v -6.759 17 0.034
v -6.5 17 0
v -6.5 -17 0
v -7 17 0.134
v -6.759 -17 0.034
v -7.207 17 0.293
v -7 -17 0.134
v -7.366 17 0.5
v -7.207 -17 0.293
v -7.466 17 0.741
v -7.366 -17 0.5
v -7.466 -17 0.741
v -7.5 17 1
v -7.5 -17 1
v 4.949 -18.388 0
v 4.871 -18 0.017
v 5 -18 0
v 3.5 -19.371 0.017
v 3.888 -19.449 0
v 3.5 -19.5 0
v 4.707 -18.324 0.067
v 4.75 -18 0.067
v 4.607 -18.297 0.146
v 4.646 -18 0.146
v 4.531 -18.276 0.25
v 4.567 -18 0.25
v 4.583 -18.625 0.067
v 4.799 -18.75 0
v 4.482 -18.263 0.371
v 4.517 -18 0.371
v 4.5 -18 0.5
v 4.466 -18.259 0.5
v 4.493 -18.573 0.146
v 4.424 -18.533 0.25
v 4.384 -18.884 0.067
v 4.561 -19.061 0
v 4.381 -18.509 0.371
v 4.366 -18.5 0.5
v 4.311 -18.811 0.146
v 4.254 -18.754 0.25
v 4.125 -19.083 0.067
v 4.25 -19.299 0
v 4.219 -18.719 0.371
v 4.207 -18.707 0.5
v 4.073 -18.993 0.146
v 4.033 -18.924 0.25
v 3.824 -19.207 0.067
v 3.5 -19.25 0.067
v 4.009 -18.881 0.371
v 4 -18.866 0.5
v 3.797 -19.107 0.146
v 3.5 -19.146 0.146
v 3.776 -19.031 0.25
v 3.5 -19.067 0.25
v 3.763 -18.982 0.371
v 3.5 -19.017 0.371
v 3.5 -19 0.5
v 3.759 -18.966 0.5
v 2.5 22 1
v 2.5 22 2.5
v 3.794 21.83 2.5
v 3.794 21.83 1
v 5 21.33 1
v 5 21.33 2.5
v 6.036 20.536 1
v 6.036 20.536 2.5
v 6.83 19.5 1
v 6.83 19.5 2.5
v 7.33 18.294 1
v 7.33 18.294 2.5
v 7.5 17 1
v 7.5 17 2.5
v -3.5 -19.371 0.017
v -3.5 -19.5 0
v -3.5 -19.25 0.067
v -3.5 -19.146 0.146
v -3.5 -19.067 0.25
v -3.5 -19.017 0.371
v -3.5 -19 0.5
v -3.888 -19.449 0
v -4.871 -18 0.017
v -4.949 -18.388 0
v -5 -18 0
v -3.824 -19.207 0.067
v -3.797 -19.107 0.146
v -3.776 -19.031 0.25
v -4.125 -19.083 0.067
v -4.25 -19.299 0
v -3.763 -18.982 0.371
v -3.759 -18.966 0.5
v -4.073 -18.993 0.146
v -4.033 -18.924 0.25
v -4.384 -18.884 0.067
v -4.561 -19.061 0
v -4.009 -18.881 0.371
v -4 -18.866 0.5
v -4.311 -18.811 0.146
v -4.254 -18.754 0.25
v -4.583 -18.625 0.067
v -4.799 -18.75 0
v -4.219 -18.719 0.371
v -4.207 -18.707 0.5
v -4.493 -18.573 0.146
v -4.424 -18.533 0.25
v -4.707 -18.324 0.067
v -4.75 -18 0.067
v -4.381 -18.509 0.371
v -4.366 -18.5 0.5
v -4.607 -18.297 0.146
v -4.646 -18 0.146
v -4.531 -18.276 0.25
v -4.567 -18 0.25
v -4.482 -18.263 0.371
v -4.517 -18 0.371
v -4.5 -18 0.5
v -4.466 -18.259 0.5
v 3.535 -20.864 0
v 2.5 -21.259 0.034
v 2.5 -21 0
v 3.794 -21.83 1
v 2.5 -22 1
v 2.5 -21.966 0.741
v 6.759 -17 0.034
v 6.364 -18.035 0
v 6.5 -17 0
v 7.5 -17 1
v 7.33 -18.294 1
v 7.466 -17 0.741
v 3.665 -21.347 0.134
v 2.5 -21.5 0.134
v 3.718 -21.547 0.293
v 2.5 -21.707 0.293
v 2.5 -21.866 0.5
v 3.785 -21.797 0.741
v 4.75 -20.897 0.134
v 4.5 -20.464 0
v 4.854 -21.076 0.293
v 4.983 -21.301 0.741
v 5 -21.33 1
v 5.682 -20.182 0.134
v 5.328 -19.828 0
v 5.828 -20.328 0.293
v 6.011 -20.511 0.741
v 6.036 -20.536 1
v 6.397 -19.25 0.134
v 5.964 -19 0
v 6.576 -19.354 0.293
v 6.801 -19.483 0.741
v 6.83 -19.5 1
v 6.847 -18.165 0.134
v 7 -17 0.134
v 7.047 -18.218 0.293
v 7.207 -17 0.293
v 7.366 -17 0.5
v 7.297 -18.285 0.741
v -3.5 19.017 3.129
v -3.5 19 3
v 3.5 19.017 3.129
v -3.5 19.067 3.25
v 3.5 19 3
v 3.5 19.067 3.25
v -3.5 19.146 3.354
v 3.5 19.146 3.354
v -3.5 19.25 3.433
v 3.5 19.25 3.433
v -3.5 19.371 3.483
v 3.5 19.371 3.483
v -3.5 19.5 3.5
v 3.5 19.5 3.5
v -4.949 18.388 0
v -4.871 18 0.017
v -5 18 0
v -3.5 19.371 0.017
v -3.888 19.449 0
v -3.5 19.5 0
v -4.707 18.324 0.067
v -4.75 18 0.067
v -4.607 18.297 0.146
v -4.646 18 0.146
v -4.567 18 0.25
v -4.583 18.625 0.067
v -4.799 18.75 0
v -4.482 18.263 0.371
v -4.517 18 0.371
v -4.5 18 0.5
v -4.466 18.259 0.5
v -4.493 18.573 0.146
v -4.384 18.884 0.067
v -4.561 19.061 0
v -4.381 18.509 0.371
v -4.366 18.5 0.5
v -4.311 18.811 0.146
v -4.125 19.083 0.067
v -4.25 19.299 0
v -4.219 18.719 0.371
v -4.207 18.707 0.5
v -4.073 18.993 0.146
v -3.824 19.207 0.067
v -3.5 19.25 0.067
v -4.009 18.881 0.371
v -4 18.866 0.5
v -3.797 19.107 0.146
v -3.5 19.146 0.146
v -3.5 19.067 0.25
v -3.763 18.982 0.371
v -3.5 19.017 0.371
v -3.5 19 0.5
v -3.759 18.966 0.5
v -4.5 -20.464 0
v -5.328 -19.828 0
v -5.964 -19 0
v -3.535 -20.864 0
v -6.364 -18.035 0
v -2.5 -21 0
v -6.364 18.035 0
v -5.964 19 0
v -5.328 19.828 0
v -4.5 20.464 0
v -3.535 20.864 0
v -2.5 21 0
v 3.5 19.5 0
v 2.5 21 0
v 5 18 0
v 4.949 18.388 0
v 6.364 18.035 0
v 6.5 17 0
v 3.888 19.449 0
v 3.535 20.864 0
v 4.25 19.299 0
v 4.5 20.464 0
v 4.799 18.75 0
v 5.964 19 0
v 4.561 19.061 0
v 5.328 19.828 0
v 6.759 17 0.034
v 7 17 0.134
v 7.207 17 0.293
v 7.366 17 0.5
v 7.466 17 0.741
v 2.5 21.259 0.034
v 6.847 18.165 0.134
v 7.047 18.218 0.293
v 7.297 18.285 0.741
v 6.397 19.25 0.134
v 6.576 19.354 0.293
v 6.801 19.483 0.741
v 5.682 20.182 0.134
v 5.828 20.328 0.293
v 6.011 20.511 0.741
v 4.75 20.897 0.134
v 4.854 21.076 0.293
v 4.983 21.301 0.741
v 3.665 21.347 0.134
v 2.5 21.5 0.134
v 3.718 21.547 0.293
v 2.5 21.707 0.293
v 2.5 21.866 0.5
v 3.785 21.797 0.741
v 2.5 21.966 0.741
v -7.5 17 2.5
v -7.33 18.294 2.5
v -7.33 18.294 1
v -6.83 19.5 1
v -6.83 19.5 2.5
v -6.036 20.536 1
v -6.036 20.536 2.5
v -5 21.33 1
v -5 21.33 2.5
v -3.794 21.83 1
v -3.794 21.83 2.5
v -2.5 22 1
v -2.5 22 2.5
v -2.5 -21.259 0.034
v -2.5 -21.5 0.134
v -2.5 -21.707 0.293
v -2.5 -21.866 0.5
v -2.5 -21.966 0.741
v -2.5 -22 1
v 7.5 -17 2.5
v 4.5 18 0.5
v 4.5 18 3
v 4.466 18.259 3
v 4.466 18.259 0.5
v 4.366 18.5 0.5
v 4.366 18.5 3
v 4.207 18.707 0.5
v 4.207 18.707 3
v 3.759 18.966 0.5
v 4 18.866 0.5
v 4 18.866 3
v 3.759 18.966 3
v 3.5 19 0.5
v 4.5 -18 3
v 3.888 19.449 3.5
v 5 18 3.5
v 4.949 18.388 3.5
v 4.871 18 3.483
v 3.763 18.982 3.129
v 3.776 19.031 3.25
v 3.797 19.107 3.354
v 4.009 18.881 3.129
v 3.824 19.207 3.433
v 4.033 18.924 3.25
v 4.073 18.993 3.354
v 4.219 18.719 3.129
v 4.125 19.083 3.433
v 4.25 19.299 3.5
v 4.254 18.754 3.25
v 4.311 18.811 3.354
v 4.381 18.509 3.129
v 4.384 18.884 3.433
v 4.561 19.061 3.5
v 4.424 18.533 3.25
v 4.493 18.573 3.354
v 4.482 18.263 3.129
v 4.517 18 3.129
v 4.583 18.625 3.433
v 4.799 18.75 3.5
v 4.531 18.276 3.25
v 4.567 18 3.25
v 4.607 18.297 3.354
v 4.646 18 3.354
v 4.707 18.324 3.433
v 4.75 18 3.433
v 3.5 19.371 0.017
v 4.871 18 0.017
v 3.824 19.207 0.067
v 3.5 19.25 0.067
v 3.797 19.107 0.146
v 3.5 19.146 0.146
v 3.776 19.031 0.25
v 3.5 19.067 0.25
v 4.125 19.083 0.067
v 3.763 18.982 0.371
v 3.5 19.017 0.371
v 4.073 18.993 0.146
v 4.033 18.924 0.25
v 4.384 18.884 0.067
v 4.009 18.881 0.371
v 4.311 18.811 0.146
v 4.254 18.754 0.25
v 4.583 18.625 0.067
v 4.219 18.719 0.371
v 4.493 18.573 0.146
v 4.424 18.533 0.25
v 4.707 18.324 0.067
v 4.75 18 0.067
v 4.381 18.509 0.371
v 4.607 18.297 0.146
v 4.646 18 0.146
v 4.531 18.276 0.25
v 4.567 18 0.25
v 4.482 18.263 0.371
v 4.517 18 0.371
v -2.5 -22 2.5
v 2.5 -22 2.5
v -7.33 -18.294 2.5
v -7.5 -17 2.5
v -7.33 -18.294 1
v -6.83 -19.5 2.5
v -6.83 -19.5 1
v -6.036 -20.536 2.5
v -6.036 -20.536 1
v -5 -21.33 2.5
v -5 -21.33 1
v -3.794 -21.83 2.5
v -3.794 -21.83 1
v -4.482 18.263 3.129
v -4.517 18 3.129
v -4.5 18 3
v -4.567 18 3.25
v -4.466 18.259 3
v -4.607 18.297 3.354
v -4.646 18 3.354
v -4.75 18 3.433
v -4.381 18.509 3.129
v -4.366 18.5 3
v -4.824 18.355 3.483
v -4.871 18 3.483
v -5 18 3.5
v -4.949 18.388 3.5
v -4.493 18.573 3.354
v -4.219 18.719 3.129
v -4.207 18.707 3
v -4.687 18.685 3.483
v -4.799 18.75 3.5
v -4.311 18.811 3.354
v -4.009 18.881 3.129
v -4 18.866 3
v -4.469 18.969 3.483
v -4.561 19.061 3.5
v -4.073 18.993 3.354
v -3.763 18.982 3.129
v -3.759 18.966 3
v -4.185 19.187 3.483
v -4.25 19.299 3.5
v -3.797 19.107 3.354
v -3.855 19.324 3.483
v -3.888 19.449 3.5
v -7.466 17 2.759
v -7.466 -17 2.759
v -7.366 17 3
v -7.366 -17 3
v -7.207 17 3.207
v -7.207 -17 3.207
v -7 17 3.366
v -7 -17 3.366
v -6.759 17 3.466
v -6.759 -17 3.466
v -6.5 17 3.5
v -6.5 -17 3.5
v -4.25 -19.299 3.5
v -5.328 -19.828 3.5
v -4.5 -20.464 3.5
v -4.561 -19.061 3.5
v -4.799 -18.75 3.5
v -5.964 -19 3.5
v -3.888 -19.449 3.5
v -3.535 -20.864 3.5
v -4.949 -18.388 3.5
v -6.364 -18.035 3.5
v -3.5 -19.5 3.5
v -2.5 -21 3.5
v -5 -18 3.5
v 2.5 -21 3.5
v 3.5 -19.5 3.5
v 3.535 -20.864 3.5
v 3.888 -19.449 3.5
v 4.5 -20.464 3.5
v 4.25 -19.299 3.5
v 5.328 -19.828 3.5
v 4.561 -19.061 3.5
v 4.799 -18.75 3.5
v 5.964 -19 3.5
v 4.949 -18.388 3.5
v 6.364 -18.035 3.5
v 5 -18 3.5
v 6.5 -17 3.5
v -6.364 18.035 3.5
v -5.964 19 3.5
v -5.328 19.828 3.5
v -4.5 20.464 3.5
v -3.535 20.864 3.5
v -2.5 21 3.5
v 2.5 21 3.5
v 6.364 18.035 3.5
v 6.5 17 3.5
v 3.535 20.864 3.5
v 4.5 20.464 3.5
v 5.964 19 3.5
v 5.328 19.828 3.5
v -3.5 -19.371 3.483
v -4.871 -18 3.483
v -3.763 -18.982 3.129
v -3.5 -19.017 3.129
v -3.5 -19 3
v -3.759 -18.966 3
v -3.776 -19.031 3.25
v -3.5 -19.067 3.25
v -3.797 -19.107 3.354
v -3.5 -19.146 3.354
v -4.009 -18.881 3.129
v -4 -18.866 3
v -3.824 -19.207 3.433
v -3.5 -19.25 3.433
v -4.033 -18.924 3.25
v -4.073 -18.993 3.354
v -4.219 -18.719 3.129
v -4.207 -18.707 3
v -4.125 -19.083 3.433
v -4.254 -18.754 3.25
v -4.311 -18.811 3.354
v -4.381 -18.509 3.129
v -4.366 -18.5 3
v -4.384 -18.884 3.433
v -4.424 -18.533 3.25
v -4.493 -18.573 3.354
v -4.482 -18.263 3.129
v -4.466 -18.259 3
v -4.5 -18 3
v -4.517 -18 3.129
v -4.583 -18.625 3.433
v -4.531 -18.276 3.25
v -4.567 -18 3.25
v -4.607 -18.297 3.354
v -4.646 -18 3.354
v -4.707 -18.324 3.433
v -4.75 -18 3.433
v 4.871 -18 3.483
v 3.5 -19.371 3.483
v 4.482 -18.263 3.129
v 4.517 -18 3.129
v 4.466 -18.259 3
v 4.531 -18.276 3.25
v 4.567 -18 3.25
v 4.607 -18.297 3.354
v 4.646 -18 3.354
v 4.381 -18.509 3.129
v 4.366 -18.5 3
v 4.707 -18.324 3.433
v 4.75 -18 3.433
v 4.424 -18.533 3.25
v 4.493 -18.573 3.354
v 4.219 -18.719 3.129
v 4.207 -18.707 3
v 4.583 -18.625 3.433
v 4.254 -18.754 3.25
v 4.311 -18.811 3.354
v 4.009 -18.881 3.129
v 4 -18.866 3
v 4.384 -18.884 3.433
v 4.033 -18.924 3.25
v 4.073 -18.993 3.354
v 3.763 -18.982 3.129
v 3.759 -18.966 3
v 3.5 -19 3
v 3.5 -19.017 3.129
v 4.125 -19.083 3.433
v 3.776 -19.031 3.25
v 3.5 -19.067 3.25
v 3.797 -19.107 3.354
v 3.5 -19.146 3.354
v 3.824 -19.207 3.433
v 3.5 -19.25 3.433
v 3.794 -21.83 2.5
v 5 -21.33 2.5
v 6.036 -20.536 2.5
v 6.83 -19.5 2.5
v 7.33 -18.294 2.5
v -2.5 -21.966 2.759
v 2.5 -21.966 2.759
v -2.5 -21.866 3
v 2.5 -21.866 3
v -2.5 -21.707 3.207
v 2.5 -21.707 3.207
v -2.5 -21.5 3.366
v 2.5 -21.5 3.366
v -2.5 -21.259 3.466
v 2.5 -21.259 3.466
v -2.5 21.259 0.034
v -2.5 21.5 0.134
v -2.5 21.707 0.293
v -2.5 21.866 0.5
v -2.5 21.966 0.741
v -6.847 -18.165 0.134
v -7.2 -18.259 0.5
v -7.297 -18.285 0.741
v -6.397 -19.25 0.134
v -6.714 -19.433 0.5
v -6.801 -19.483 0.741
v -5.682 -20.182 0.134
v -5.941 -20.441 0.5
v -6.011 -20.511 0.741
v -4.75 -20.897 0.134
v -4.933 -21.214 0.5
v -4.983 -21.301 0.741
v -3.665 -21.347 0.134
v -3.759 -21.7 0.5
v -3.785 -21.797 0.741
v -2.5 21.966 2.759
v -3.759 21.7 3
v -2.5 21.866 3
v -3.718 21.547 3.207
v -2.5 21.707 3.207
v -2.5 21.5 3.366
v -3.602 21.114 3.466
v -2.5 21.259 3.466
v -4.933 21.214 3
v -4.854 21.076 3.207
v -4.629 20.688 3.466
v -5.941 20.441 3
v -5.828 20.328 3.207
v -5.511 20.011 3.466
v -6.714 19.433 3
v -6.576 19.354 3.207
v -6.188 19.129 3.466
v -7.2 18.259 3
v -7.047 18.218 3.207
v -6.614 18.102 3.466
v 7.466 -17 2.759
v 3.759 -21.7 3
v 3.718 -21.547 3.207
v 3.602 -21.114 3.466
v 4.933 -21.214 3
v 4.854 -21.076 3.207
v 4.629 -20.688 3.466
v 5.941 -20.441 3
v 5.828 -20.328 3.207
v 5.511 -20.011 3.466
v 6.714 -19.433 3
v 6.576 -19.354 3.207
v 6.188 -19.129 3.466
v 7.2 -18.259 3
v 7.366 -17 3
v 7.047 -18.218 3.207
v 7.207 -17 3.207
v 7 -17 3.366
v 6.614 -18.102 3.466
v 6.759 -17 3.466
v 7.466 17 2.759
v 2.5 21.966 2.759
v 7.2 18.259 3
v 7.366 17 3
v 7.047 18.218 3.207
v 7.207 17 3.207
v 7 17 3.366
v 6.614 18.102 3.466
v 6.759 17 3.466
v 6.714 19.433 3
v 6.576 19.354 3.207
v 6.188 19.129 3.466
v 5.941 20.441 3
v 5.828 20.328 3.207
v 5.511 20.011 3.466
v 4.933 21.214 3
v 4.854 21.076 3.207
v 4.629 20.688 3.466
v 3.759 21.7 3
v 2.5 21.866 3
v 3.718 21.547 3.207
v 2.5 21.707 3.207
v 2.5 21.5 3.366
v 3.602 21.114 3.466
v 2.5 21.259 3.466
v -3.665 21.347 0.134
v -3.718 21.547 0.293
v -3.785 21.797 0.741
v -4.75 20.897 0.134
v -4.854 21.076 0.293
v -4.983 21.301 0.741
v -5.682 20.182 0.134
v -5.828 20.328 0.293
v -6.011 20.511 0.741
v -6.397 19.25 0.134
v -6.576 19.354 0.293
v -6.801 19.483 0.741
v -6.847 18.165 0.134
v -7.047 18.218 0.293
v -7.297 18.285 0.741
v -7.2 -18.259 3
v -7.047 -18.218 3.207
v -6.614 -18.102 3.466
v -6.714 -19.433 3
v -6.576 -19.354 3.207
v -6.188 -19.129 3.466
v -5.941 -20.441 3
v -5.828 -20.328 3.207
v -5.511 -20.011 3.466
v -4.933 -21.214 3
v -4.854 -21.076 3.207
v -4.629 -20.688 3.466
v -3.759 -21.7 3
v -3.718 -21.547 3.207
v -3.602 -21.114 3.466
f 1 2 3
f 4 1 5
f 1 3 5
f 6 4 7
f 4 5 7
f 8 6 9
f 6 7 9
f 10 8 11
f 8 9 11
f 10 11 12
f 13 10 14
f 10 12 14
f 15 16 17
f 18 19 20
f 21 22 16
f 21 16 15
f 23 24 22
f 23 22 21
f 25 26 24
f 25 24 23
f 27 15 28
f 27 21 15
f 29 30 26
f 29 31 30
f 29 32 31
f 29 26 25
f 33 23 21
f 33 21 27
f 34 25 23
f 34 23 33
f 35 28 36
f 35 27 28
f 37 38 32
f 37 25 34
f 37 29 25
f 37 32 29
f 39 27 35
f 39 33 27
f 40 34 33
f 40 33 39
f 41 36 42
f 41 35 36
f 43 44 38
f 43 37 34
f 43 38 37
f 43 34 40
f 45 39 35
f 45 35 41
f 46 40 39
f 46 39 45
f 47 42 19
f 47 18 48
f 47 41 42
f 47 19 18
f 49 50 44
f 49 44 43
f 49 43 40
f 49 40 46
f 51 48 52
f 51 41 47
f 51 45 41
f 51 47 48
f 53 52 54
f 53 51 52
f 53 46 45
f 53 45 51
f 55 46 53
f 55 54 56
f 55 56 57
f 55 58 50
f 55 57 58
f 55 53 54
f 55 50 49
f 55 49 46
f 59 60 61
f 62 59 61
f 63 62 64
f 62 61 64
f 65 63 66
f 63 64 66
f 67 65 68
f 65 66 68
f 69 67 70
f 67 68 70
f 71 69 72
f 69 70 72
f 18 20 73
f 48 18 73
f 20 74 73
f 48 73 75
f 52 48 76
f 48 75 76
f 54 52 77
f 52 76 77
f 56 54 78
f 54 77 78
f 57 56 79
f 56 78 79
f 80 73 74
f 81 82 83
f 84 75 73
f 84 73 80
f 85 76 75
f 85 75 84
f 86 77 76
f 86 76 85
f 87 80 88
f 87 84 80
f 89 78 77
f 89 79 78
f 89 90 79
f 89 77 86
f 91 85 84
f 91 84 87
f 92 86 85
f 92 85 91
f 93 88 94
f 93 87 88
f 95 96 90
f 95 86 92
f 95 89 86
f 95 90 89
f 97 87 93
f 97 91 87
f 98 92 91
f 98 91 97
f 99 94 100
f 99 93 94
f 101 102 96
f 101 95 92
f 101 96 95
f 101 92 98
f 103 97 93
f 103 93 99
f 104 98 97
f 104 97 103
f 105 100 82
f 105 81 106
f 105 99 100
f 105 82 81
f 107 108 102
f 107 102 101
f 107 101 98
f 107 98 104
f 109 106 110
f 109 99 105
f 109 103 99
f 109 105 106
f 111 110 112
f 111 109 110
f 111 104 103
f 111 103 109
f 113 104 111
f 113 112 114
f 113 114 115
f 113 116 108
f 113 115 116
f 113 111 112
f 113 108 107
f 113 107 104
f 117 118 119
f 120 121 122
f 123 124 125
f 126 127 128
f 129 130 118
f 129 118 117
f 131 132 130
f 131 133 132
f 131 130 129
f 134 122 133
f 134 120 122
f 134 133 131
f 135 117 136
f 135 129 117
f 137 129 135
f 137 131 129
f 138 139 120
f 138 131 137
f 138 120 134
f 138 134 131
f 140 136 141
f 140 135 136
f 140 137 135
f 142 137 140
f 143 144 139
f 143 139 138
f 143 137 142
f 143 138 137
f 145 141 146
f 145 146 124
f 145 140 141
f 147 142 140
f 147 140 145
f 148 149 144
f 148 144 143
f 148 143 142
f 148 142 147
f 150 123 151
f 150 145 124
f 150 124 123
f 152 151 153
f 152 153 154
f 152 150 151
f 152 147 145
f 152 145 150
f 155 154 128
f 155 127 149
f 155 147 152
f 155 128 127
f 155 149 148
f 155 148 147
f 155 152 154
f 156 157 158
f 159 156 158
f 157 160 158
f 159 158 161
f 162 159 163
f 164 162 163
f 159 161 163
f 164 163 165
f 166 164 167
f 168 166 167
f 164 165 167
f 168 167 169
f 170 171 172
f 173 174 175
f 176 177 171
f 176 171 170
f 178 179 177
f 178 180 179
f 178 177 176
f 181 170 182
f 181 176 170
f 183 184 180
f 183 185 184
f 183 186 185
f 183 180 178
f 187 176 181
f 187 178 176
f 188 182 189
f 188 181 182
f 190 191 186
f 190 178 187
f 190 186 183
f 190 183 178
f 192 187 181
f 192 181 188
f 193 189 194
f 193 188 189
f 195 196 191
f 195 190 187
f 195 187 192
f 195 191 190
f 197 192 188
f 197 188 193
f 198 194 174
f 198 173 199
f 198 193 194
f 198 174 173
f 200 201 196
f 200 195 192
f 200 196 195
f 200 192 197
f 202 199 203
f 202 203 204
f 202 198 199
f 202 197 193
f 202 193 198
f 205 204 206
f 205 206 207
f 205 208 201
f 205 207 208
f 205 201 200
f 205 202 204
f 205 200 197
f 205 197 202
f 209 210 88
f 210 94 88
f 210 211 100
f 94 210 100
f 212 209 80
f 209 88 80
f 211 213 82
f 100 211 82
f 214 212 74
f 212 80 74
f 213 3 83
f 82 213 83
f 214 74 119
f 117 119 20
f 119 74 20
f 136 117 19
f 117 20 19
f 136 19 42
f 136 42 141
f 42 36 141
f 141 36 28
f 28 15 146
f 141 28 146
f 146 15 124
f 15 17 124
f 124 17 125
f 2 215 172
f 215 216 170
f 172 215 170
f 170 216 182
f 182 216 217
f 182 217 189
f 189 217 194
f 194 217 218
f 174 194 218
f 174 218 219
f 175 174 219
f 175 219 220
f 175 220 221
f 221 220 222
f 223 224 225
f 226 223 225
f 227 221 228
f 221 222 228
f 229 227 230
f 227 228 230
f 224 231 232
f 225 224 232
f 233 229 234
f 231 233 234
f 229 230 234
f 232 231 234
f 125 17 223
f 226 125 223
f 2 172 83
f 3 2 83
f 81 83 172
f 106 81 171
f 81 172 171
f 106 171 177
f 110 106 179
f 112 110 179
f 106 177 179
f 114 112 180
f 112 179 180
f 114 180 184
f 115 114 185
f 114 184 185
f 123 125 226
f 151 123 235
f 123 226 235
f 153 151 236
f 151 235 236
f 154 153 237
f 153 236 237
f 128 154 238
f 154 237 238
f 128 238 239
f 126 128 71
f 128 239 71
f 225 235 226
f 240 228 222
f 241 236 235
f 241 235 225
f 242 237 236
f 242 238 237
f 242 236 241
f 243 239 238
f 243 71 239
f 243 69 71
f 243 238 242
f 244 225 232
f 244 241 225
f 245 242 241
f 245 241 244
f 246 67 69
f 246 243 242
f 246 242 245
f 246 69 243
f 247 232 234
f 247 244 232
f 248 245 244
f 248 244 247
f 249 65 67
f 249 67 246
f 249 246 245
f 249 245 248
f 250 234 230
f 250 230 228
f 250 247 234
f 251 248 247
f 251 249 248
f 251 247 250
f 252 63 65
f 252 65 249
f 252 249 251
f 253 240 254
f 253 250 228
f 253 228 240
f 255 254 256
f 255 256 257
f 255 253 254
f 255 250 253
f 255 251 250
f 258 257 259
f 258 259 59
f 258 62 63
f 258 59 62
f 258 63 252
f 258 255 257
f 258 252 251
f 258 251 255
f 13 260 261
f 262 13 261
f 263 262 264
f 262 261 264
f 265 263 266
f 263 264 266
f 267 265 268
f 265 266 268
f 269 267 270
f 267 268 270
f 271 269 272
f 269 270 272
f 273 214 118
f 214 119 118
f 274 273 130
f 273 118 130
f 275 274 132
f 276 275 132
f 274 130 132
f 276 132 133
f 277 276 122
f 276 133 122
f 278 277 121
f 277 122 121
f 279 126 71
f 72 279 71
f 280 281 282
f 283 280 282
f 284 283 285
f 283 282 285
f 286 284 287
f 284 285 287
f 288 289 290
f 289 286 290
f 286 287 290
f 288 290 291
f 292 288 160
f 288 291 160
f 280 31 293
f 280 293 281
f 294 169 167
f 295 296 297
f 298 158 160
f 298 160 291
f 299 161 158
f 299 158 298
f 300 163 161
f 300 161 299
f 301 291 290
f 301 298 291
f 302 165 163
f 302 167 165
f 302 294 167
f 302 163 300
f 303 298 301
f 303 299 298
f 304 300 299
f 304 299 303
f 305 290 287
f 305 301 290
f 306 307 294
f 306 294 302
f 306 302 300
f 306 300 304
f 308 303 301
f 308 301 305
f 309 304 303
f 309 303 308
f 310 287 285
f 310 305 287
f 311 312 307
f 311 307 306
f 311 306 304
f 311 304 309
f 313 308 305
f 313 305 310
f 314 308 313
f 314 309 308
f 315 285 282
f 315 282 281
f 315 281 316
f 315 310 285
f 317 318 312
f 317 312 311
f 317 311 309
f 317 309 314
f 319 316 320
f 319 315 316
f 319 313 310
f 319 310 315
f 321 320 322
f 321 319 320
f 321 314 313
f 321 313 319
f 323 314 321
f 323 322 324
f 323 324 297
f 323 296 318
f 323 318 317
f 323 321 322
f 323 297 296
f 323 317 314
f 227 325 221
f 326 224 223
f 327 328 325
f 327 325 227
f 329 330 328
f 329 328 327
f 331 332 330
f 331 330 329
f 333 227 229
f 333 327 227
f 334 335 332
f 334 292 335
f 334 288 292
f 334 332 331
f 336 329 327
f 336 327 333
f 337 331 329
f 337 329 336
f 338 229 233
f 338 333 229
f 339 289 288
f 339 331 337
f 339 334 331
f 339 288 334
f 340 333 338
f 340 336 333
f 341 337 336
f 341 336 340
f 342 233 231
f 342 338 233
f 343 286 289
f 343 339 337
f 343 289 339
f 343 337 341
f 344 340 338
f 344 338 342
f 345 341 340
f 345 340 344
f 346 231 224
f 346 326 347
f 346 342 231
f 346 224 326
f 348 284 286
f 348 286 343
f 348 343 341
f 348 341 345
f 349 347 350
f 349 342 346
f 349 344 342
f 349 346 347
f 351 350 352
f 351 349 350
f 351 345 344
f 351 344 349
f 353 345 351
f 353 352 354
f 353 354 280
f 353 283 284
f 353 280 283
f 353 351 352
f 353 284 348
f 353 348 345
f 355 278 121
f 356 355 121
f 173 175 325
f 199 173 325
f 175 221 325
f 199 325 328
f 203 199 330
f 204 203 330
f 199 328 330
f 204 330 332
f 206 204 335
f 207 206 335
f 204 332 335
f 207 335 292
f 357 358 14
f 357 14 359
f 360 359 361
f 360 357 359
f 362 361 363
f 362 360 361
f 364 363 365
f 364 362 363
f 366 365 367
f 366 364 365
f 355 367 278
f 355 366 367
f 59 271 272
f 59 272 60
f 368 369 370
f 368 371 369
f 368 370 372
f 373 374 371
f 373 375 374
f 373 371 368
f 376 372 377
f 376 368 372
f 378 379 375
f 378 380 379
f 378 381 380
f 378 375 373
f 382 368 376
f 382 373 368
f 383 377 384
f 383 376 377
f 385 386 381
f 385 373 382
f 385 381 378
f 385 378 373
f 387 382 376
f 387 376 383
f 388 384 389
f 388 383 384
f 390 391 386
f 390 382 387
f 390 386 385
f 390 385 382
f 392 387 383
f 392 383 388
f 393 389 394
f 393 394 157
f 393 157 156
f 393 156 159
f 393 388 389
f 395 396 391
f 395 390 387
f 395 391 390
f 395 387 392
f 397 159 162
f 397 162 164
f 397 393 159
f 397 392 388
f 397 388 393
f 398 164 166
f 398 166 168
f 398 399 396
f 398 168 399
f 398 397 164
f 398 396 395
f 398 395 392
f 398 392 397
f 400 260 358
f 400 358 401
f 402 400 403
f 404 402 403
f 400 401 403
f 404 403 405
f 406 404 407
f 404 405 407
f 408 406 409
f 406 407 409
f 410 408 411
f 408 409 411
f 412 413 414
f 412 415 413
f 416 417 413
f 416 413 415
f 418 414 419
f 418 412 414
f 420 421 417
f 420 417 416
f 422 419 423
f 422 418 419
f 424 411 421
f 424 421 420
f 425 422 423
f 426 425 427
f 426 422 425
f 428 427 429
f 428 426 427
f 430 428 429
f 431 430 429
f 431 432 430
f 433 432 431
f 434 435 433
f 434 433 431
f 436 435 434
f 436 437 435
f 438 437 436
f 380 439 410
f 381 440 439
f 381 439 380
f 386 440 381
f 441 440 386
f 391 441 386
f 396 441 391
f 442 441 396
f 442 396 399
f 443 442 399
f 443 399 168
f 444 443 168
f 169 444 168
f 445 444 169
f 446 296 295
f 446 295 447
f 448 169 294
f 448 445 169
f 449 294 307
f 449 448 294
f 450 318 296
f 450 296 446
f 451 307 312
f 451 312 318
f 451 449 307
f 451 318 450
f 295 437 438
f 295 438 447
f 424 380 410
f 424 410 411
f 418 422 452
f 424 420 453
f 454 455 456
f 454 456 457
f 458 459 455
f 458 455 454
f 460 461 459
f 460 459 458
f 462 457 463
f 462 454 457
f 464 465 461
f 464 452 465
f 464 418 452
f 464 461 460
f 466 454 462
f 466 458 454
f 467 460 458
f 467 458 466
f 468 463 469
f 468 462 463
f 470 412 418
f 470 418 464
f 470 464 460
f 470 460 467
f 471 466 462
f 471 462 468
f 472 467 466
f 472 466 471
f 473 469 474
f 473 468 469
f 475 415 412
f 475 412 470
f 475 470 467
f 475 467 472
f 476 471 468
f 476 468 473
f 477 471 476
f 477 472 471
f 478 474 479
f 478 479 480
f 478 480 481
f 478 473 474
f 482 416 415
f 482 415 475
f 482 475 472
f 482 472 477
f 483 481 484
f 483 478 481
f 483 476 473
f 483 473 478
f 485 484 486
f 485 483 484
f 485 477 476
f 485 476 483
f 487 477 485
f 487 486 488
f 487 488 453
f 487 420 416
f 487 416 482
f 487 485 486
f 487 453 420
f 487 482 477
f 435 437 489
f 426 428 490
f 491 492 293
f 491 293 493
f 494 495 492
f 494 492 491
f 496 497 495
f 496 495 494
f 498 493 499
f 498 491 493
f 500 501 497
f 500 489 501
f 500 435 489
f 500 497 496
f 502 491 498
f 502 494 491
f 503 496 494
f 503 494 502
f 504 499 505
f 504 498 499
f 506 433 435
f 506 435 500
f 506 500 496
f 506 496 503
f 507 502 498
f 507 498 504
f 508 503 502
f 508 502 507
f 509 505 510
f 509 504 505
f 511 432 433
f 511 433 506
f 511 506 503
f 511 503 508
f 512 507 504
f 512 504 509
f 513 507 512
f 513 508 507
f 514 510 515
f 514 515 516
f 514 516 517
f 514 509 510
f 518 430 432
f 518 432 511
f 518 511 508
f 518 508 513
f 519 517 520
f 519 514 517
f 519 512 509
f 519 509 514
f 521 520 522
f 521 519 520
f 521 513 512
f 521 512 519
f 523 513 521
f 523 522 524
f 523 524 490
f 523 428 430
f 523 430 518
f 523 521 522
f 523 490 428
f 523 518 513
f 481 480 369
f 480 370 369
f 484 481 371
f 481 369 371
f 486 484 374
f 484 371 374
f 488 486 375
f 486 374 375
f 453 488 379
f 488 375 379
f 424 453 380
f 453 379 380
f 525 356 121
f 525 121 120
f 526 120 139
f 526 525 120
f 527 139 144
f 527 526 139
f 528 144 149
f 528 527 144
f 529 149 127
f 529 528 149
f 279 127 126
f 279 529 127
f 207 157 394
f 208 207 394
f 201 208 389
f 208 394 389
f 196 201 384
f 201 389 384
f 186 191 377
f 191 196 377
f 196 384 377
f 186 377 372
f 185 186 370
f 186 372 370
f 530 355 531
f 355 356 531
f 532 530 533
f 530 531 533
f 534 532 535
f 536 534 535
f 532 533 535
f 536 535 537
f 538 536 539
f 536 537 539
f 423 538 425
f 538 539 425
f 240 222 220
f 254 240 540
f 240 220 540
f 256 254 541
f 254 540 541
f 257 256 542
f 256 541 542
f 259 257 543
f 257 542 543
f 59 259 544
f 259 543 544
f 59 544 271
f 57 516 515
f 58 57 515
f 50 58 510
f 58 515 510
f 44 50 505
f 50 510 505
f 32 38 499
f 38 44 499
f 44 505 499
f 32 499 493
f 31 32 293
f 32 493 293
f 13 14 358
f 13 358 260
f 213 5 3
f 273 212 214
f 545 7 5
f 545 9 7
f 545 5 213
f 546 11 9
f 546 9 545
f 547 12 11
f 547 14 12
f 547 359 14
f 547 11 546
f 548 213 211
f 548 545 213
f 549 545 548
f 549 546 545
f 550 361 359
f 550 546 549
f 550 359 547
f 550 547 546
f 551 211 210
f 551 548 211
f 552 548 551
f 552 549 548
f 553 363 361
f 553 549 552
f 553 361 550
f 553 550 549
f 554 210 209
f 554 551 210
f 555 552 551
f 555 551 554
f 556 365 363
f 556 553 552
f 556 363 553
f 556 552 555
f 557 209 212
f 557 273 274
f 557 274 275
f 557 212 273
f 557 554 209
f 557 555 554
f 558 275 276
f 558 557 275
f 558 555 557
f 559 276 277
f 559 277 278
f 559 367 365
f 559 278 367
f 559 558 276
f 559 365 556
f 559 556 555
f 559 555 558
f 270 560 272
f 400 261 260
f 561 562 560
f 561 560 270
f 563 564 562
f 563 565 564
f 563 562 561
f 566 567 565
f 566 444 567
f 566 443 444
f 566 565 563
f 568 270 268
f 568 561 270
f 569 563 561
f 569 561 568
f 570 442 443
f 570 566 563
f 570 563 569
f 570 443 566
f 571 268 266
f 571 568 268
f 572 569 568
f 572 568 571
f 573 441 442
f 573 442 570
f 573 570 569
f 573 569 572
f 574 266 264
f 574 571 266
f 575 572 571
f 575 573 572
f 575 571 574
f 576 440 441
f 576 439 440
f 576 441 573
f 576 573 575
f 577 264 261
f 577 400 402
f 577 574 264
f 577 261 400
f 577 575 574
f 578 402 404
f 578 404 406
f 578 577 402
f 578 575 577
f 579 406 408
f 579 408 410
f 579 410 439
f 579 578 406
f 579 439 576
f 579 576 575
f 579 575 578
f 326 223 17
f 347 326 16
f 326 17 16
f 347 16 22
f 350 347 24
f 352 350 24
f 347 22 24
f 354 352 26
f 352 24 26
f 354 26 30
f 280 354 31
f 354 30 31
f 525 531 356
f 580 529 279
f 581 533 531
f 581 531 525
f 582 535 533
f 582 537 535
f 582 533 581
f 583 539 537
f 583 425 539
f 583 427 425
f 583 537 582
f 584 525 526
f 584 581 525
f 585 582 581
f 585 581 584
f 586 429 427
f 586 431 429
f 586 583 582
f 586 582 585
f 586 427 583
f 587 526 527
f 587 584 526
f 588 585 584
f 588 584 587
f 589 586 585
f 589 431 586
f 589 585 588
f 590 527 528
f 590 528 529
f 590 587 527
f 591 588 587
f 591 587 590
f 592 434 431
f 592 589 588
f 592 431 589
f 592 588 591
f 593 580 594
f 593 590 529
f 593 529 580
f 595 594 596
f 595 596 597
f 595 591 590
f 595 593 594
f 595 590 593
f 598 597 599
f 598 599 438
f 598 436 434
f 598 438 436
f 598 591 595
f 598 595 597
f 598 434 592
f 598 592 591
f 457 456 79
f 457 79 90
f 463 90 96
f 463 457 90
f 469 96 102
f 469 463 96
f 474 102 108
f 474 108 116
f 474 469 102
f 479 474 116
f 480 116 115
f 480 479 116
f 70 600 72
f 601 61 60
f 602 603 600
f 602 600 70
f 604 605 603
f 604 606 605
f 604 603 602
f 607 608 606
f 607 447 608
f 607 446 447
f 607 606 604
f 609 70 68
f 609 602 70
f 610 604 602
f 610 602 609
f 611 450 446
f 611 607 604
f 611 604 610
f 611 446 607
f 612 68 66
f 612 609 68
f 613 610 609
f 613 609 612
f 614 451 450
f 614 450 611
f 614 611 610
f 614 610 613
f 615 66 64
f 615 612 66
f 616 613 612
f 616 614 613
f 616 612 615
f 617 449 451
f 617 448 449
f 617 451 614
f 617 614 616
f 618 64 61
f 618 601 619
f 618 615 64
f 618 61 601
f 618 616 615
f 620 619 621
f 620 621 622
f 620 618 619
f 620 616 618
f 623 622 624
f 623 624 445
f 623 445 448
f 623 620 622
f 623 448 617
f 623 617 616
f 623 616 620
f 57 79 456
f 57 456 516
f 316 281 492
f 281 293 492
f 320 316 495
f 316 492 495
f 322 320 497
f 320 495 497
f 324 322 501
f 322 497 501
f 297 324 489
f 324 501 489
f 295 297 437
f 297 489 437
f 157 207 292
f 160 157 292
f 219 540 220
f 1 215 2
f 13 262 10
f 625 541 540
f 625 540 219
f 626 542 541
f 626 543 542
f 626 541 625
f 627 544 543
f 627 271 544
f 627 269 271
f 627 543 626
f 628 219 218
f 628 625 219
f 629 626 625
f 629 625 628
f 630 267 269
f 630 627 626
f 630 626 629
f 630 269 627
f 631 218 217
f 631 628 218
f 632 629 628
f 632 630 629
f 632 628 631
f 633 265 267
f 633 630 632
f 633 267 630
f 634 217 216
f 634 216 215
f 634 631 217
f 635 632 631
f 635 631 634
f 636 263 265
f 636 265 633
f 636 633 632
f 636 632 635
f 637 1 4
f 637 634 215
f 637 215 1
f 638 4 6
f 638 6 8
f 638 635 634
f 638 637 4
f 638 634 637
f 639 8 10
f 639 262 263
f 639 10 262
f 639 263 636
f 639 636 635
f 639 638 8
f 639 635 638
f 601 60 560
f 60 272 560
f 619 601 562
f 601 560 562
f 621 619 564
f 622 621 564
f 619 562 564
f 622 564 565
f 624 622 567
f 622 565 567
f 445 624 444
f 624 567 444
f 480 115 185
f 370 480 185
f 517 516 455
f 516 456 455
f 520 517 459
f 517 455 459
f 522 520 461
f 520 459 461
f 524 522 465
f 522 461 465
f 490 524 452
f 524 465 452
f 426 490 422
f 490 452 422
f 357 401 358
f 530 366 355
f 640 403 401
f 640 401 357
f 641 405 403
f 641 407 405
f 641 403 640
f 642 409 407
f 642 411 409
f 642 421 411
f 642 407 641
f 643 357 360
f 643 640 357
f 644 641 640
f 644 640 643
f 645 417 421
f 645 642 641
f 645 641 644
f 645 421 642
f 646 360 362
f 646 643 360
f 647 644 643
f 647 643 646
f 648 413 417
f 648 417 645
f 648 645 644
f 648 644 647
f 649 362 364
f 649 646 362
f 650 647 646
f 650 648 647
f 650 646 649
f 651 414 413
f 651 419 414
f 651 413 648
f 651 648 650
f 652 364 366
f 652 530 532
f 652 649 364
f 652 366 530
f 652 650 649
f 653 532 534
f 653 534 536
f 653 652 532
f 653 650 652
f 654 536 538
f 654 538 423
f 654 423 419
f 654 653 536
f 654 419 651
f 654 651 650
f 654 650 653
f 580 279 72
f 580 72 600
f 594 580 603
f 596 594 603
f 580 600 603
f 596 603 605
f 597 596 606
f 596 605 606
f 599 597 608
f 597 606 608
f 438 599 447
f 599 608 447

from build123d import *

# Parameters (mm, degrees)
F0_W     = 15
F0_H     = 44
F0_W_2   = 9
F0_H_2   = 38
F1_DEPTH = 3.5
F2_R     = 1
F3_R     = 5
F4_R     = 0.5
F5_R     = 1


with BuildPart() as f1:
    # F0 (on Top) → F1 (new body)
    with BuildSketch(Plane.XY):
        Rectangle(F0_W, F0_H)
        Rectangle(F0_W_2, F0_H_2, mode=Mode.SUBTRACT)
    extrude(amount=F1_DEPTH)

    # F2
    f2_edges = [f1.edges().sort_by_distance(p)[0] for p in [
        (4.5, 19, 1.75),
        (-4.5, 19, 1.75),
        (-4.5, -19, 1.75),
        (4.5, -19, 1.75),
    ]]
    fillet(f2_edges, radius=F2_R)

    # F3
    f3_edges = [f1.edges().sort_by_distance(p)[0] for p in [
        (-7.5, -22, 1.75),
        (7.5, -22, 1.75),
        (-7.5, 22, 1.75),
        (7.5, 22, 1.75),
    ]]
    fillet(f3_edges, radius=F3_R)

    # F4
    f4_edges = [f1.edges().sort_by_distance(p)[0] for p in [
        (0, 19, 0),
        (0, 19, 3.5),
    ]]
    fillet(f4_edges, radius=F4_R)

    # F5
    f5_edges = [f1.edges().sort_by_distance(p)[0] for p in [
        (0, -22, 3.5),
        (0, -22, 0),
    ]]
    fillet(f5_edges, radius=F5_R)


solid = f1.part
